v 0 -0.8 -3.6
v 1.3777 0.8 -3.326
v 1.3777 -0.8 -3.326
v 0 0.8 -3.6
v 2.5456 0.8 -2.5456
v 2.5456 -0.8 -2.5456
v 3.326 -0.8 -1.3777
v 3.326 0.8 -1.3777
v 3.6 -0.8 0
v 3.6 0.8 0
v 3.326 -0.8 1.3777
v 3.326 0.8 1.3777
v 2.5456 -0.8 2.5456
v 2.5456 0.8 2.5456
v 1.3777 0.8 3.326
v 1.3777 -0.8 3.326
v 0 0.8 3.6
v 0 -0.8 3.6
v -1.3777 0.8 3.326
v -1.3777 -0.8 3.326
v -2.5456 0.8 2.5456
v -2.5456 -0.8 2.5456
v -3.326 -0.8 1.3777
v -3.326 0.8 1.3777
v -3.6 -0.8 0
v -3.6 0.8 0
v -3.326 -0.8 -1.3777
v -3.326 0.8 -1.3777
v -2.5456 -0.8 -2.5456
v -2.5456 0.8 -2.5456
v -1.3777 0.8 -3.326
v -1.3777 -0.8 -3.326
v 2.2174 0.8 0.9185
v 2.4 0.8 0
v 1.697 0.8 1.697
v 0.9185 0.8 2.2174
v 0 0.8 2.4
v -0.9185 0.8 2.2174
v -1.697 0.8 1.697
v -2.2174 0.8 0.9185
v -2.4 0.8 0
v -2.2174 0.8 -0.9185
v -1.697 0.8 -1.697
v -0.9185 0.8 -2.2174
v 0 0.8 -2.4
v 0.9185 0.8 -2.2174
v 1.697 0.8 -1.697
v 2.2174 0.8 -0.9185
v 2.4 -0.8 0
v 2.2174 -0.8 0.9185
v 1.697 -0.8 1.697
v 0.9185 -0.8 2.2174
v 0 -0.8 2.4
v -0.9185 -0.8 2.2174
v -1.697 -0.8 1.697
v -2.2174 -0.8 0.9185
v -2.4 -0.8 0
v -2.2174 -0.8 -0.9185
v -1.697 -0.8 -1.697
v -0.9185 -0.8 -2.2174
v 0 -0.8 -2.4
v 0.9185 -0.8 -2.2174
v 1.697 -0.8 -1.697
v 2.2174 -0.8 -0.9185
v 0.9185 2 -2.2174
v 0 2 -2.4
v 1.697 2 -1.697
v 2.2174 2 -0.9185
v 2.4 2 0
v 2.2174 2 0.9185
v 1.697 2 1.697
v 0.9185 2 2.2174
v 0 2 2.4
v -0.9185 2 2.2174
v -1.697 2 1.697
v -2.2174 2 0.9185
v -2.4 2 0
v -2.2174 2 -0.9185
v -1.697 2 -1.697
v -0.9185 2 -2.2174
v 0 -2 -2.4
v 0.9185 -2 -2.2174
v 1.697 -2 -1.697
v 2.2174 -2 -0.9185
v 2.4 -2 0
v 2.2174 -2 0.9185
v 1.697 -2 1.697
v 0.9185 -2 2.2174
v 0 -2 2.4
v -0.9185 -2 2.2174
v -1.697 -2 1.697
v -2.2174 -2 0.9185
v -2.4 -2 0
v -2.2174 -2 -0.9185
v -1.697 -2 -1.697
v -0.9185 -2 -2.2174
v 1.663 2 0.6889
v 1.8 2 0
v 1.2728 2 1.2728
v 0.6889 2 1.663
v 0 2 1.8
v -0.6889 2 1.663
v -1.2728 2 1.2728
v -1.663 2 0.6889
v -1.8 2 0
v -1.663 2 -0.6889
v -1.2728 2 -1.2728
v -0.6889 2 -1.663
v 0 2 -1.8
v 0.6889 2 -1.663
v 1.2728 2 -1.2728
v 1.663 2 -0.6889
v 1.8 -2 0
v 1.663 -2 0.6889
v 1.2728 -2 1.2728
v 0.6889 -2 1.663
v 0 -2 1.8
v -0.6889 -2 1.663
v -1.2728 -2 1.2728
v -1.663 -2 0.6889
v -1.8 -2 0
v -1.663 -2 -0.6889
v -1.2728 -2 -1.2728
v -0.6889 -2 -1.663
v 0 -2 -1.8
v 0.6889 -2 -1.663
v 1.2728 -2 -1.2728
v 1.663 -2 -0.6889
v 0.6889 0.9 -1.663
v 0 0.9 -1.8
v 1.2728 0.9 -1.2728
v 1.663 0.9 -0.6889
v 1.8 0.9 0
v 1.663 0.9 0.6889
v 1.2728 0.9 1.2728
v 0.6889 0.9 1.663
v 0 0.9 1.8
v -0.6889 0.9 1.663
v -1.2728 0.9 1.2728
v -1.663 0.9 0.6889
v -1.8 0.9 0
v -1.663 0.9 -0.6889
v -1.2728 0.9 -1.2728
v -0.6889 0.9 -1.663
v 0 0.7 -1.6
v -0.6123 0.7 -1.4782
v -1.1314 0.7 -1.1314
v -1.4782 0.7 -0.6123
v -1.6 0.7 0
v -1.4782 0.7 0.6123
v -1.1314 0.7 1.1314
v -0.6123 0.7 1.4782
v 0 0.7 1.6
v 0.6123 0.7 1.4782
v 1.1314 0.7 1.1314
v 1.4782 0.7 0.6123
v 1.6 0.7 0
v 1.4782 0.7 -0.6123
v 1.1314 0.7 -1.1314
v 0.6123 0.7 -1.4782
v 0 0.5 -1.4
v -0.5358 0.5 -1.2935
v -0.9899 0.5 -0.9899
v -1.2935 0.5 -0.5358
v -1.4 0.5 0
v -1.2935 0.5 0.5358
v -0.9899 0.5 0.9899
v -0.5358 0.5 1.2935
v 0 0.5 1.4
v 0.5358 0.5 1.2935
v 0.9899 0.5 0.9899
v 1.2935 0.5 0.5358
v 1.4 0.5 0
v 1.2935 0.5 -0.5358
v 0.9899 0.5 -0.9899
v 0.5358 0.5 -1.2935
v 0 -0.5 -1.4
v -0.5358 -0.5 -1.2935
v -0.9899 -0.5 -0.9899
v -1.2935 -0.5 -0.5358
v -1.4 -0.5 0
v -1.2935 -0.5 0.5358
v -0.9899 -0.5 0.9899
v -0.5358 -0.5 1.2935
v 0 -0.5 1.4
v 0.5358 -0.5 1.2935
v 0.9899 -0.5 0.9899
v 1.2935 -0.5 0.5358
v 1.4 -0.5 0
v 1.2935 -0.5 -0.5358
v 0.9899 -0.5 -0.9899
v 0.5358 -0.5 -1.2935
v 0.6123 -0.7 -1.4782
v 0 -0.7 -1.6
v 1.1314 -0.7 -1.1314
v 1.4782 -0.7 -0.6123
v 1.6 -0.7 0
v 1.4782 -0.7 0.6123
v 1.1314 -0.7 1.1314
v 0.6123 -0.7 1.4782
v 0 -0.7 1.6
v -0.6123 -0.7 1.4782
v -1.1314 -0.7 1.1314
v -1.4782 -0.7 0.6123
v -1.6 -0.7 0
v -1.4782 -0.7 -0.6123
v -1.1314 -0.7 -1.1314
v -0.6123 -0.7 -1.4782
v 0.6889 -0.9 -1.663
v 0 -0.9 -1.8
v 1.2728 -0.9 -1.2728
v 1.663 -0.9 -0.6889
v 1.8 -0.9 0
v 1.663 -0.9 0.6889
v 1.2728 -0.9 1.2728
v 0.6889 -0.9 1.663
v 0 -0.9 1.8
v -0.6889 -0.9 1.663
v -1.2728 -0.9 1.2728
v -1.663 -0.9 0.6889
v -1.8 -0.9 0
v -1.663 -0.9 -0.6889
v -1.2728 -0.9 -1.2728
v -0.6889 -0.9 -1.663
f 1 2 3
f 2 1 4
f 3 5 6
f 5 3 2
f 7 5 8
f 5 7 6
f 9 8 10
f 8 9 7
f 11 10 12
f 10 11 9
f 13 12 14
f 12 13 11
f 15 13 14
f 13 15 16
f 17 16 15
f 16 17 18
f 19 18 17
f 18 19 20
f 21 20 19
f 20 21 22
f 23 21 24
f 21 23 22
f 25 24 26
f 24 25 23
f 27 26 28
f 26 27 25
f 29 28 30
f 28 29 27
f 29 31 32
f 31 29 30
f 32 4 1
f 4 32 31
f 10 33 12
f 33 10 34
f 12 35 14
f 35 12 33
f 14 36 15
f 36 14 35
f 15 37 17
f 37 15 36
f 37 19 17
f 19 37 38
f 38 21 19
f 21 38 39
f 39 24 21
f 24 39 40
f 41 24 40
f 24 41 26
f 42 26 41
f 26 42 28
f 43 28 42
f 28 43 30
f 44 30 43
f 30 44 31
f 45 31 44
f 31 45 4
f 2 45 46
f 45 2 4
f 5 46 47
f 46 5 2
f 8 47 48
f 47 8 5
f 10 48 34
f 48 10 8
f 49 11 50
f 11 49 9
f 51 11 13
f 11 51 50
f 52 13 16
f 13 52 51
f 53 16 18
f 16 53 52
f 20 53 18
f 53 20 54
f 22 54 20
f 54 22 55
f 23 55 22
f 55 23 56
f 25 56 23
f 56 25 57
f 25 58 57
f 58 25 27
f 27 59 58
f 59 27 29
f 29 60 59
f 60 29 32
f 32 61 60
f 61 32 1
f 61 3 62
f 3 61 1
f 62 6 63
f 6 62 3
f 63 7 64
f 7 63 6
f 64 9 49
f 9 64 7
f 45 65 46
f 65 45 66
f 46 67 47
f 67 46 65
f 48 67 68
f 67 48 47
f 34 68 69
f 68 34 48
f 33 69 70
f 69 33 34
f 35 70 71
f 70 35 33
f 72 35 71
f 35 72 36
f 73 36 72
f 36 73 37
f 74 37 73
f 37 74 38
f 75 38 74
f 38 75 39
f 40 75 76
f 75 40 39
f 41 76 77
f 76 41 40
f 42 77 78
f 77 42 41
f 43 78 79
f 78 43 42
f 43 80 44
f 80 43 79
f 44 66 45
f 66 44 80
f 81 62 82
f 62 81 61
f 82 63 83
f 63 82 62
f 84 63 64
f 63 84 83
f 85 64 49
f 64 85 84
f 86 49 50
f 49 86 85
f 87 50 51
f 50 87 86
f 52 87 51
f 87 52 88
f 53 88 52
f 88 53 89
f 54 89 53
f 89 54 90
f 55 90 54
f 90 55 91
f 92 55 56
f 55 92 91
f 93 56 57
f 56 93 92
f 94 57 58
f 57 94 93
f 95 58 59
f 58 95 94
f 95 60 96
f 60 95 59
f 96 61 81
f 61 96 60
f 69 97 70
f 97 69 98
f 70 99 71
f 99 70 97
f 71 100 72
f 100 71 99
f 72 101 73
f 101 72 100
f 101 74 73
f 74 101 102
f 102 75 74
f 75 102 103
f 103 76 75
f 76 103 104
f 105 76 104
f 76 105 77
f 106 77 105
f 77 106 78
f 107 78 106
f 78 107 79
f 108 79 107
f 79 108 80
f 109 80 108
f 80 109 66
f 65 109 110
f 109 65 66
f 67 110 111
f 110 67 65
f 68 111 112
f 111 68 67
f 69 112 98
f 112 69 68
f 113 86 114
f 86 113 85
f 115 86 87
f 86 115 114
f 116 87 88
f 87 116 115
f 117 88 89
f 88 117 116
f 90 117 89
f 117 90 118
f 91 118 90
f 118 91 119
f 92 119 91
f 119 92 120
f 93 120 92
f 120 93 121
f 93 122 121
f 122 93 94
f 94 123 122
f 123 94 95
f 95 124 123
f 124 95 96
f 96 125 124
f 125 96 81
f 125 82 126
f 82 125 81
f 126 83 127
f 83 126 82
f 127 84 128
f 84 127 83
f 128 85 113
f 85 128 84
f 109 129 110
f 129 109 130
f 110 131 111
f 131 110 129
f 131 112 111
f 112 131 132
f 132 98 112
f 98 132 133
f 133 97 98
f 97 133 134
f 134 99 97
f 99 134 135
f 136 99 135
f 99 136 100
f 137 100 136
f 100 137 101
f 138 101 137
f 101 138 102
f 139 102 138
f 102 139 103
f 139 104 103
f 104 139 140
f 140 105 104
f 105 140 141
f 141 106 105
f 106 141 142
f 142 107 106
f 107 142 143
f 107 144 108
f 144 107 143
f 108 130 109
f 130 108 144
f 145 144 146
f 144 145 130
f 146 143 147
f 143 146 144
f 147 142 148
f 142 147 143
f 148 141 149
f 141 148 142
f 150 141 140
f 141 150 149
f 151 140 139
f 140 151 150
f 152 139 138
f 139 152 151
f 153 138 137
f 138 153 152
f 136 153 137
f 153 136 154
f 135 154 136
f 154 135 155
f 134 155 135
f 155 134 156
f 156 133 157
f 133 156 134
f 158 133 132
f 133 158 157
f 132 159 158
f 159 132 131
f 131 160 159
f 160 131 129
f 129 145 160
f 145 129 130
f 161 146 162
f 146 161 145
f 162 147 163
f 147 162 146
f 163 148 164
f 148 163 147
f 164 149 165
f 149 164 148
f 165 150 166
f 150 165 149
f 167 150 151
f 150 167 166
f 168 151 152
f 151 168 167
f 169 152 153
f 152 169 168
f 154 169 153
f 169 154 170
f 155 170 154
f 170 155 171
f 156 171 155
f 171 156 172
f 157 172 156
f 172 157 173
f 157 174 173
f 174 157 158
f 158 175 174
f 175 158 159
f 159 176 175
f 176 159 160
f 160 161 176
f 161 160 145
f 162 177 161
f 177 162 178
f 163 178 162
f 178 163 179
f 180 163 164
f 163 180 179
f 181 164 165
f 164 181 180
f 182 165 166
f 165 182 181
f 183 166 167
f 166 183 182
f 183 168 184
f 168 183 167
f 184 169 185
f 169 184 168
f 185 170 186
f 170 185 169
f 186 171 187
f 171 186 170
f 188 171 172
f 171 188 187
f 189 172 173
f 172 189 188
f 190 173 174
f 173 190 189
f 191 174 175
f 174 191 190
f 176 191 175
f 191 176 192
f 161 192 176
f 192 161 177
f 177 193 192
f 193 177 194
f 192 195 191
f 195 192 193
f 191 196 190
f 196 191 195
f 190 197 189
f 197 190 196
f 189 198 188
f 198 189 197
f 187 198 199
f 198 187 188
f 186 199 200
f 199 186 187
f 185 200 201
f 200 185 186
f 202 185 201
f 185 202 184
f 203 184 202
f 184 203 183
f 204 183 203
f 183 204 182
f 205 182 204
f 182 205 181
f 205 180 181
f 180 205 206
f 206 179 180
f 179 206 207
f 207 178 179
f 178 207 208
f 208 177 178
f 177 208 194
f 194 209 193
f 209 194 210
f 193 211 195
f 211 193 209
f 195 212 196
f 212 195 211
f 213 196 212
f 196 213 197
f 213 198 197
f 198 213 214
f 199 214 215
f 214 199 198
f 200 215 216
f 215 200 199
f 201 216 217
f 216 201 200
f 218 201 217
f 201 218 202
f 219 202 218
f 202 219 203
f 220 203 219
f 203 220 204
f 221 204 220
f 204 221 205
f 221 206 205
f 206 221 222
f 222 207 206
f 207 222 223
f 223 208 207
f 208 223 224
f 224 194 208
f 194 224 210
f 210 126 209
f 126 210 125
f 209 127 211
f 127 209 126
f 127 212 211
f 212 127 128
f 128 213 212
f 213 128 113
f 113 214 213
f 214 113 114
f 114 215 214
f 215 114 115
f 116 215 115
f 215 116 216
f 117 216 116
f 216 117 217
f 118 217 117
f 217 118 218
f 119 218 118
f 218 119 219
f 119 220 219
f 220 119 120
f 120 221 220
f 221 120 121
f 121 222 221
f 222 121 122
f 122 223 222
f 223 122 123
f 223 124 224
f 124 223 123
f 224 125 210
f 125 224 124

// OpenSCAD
// file: ../../p/4-4edge.scad
use <../lib.scad>
function ldraw_lib__4_4edge() = [
// 0 Circle 1.0
// 0 Name: 4-4edge.dat
// 0 Author: James Jessiman
// 0 !LDRAW_ORG Primitive UPDATE 2017-01
// 0 !LICENSE Licensed under CC BY 2.0 and CC BY 4.0 : see CAreadme.txt
// 
// 0 BFC CERTIFY CCW
  [0,"BFC","CERTIFY"],
  [0,"BFC","CCW"],
// 
// 0 !HISTORY 1998-12-15 [PTadmin] Official Update 1998-10
// 0 !HISTORY 2005-12-28 [PTadmin] Official Update 2005-01
// 0 !HISTORY 2007-06-24 [PTadmin] Header formatted for Contributor Agreement
// 0 !HISTORY 2008-07-01 [PTadmin] Official Update 2008-01
// 0 !HISTORY 2017-01-15 [Steffen] BFCed
// 0 !HISTORY 2017-12-30 [PTadmin] Official Update 2017-01
// 
// 
// 2 24 1 0 0 0.9239 0 0.3827
  [2,24,1,0,0,0.9239,0,0.3827],
// 2 24 0.9239 0 0.3827 0.7071 0 0.7071
  [2,24,0.9239,0,0.3827,0.7071,0,0.7071],
// 2 24 0.7071 0 0.7071 0.3827 0 0.9239
  [2,24,0.7071,0,0.7071,0.3827,0,0.9239],
// 2 24 0.3827 0 0.9239 0 0 1
  [2,24,0.3827,0,0.9239,0,0,1],
// 2 24 0 0 1 -0.3827 0 0.9239
  [2,24,0,0,1,-0.3827,0,0.9239],
// 2 24 -0.3827 0 0.9239 -0.7071 0 0.7071
  [2,24,-0.3827,0,0.9239,-0.7071,0,0.7071],
// 2 24 -0.7071 0 0.7071 -0.9239 0 0.3827
  [2,24,-0.7071,0,0.7071,-0.9239,0,0.3827],
// 2 24 -0.9239 0 0.3827 -1 0 -0
  [2,24,-0.9239,0,0.3827,-1,0,-0],
// 2 24 -1 0 -0 -0.9239 0 -0.3827
  [2,24,-1,0,-0,-0.9239,0,-0.3827],
// 2 24 -0.9239 0 -0.3827 -0.7071 0 -0.7071
  [2,24,-0.9239,0,-0.3827,-0.7071,0,-0.7071],
// 2 24 -0.7071 0 -0.7071 -0.3827 0 -0.9239
  [2,24,-0.7071,0,-0.7071,-0.3827,0,-0.9239],
// 2 24 -0.3827 0 -0.9239 0 0 -1
  [2,24,-0.3827,0,-0.9239,0,0,-1],
// 2 24 0 0 -1 0.3827 0 -0.9239
  [2,24,0,0,-1,0.3827,0,-0.9239],
// 2 24 0.3827 0 -0.9239 0.7071 0 -0.7071
  [2,24,0.3827,0,-0.9239,0.7071,0,-0.7071],
// 2 24 0.7071 0 -0.7071 0.9239 0 -0.3827
  [2,24,0.7071,0,-0.7071,0.9239,0,-0.3827],
// 2 24 0.9239 0 -0.3827 1 0 0
  [2,24,0.9239,0,-0.3827,1,0,0],
];
module ldraw_lib__4_4edge(step=0, col=false, unit=2/5, alt=false, line=0.2, solid=!$preview)
    makepoly(ldraw_lib__4_4edge(), step=step, col=col, unit=unit, alt=alt, line=line, solid=solid);
ldraw_lib__4_4edge(line=0.2);
// file: ../../p/4-4cyli.scad
use <../lib.scad>
function ldraw_lib__4_4cyli() = [
// 0 Cylinder 1.0
// 0 Name: 4-4cyli.dat
// 0 Author: James Jessiman
// 0 !LDRAW_ORG Primitive UPDATE 2005-01
// 0 !LICENSE Licensed under CC BY 2.0 and CC BY 4.0 : see CAreadme.txt
// 
// 0 BFC CERTIFY CCW
  [0,"BFC","CERTIFY"],
  [0,"BFC","CCW"],
// 
// 0 !HISTORY 1998-12-15 [PTadmin] Official Update 1998-10
// 0 !HISTORY 2002-03-23 [sbliss] Added BFC statement; merged headers from files in distributions LDraw 0.27 and Complete.
// 0 !HISTORY 2002-04-25 [PTadmin] Official Update 2002-02
// 0 !HISTORY 2004-12-14 [guyvivan] BFC CCW
// 0 !HISTORY 2005-12-28 [PTadmin] Official Update 2005-01
// 0 !HISTORY 2007-06-24 [PTadmin] Header formatted for Contributor Agreement
// 0 !HISTORY 2008-07-01 [PTadmin] Official Update 2008-01
// 
// 
// 4 16 1 1 0 0.9239 1 0.3827 0.9239 0 0.3827 1 0 0
  [4,16,1,1,0,0.9239,1,0.3827,0.9239,0,0.3827,1,0,0],
// 5 24 1 0 0 1 1 0 0.9239 0 0.3827 0.9239 0 -0.3827
  [5,24,1,0,0,1,1,0,0.9239,0,0.3827,0.9239,0,-0.3827],
// 4 16 0.9239 1 0.3827 0.7071 1 0.7071 0.7071 0 0.7071 0.9239 0 0.3827
  [4,16,0.9239,1,0.3827,0.7071,1,0.7071,0.7071,0,0.7071,0.9239,0,0.3827],
// 5 24 0.9239 0 0.3827 0.9239 1 0.3827 0.7071 0 0.7071 1 0 0
  [5,24,0.9239,0,0.3827,0.9239,1,0.3827,0.7071,0,0.7071,1,0,0],
// 4 16 0.7071 1 0.7071 0.3827 1 0.9239 0.3827 0 0.9239 0.7071 0 0.7071
  [4,16,0.7071,1,0.7071,0.3827,1,0.9239,0.3827,0,0.9239,0.7071,0,0.7071],
// 5 24 0.7071 0 0.7071 0.7071 1 0.7071 0.3827 0 0.9239 0.9239 0 0.3827
  [5,24,0.7071,0,0.7071,0.7071,1,0.7071,0.3827,0,0.9239,0.9239,0,0.3827],
// 4 16 0.3827 1 0.9239 0 1 1 0 0 1 0.3827 0 0.9239
  [4,16,0.3827,1,0.9239,0,1,1,0,0,1,0.3827,0,0.9239],
// 5 24 0.3827 0 0.9239 0.3827 1 0.9239 0 0 1 0.7071 0 0.7071
  [5,24,0.3827,0,0.9239,0.3827,1,0.9239,0,0,1,0.7071,0,0.7071],
// 4 16 0 1 1 -0.3827 1 0.9239 -0.3827 0 0.9239 0 0 1
  [4,16,0,1,1,-0.3827,1,0.9239,-0.3827,0,0.9239,0,0,1],
// 5 24 0 0 1 0 1 1 -0.3827 0 0.9239 0.3827 0 0.9239
  [5,24,0,0,1,0,1,1,-0.3827,0,0.9239,0.3827,0,0.9239],
// 4 16 -0.3827 1 0.9239 -0.7071 1 0.7071 -0.7071 0 0.7071 -0.3827 0 0.9239
  [4,16,-0.3827,1,0.9239,-0.7071,1,0.7071,-0.7071,0,0.7071,-0.3827,0,0.9239],
// 5 24 -0.3827 0 0.9239 -0.3827 1 0.9239 -0.7071 0 0.7071 0 0 1
  [5,24,-0.3827,0,0.9239,-0.3827,1,0.9239,-0.7071,0,0.7071,0,0,1],
// 4 16 -0.7071 1 0.7071 -0.9239 1 0.3827 -0.9239 0 0.3827 -0.7071 0 0.7071
  [4,16,-0.7071,1,0.7071,-0.9239,1,0.3827,-0.9239,0,0.3827,-0.7071,0,0.7071],
// 5 24 -0.7071 0 0.7071 -0.7071 1 0.7071 -0.9239 0 0.3827 -0.3827 0 0.9239
  [5,24,-0.7071,0,0.7071,-0.7071,1,0.7071,-0.9239,0,0.3827,-0.3827,0,0.9239],
// 4 16 -0.9239 1 0.3827 -1 1 0 -1 0 0 -0.9239 0 0.3827
  [4,16,-0.9239,1,0.3827,-1,1,0,-1,0,0,-0.9239,0,0.3827],
// 5 24 -0.9239 0 0.3827 -0.9239 1 0.3827 -1 0 0 -0.7071 0 0.7071
  [5,24,-0.9239,0,0.3827,-0.9239,1,0.3827,-1,0,0,-0.7071,0,0.7071],
// 4 16 -1 1 0 -0.9239 1 -0.3827 -0.9239 0 -0.3827 -1 0 0
  [4,16,-1,1,0,-0.9239,1,-0.3827,-0.9239,0,-0.3827,-1,0,0],
// 5 24 -1 0 0 -1 1 0 -0.9239 0 -0.3827 -0.9239 0 0.3827
  [5,24,-1,0,0,-1,1,0,-0.9239,0,-0.3827,-0.9239,0,0.3827],
// 4 16 -0.9239 1 -0.3827 -0.7071 1 -0.7071 -0.7071 0 -0.7071 -0.9239 0 -0.3827
  [4,16,-0.9239,1,-0.3827,-0.7071,1,-0.7071,-0.7071,0,-0.7071,-0.9239,0,-0.3827],
// 5 24 -0.9239 0 -0.3827 -0.9239 1 -0.3827 -0.7071 0 -0.7071 -1 0 0
  [5,24,-0.9239,0,-0.3827,-0.9239,1,-0.3827,-0.7071,0,-0.7071,-1,0,0],
// 4 16 -0.7071 1 -0.7071 -0.3827 1 -0.9239 -0.3827 0 -0.9239 -0.7071 0 -0.7071
  [4,16,-0.7071,1,-0.7071,-0.3827,1,-0.9239,-0.3827,0,-0.9239,-0.7071,0,-0.7071],
// 5 24 -0.7071 0 -0.7071 -0.7071 1 -0.7071 -0.3827 0 -0.9239 -0.9239 0 -0.3827
  [5,24,-0.7071,0,-0.7071,-0.7071,1,-0.7071,-0.3827,0,-0.9239,-0.9239,0,-0.3827],
// 4 16 -0.3827 1 -0.9239 0 1 -1 0 0 -1 -0.3827 0 -0.9239
  [4,16,-0.3827,1,-0.9239,0,1,-1,0,0,-1,-0.3827,0,-0.9239],
// 5 24 -0.3827 0 -0.9239 -0.3827 1 -0.9239 0 0 -1 -0.7071 0 -0.7071
  [5,24,-0.3827,0,-0.9239,-0.3827,1,-0.9239,0,0,-1,-0.7071,0,-0.7071],
// 4 16 0 1 -1 0.3827 1 -0.9239 0.3827 0 -0.9239 0 0 -1
  [4,16,0,1,-1,0.3827,1,-0.9239,0.3827,0,-0.9239,0,0,-1],
// 5 24 0 0 -1 0 1 -1 0.3827 0 -0.9239 -0.3827 0 -0.9239
  [5,24,0,0,-1,0,1,-1,0.3827,0,-0.9239,-0.3827,0,-0.9239],
// 4 16 0.3827 1 -0.9239 0.7071 1 -0.7071 0.7071 0 -0.7071 0.3827 0 -0.9239
  [4,16,0.3827,1,-0.9239,0.7071,1,-0.7071,0.7071,0,-0.7071,0.3827,0,-0.9239],
// 5 24 0.3827 0 -0.9239 0.3827 1 -0.9239 0.7071 0 -0.7071 0 0 -1
  [5,24,0.3827,0,-0.9239,0.3827,1,-0.9239,0.7071,0,-0.7071,0,0,-1],
// 4 16 0.7071 1 -0.7071 0.9239 1 -0.3827 0.9239 0 -0.3827 0.7071 0 -0.7071
  [4,16,0.7071,1,-0.7071,0.9239,1,-0.3827,0.9239,0,-0.3827,0.7071,0,-0.7071],
// 5 24 0.7071 0 -0.7071 0.7071 1 -0.7071 0.9239 0 -0.3827 0.3827 0 -0.9239
  [5,24,0.7071,0,-0.7071,0.7071,1,-0.7071,0.9239,0,-0.3827,0.3827,0,-0.9239],
// 4 16 0.9239 1 -0.3827 1 1 0 1 0 0 0.9239 0 -0.3827
  [4,16,0.9239,1,-0.3827,1,1,0,1,0,0,0.9239,0,-0.3827],
// 5 24 0.9239 0 -0.3827 0.9239 1 -0.3827 1 0 0 0.7071 0 -0.7071
  [5,24,0.9239,0,-0.3827,0.9239,1,-0.3827,1,0,0,0.7071,0,-0.7071],
// 0
];
module ldraw_lib__4_4cyli(step=0, col=false, unit=2/5, alt=false, line=0.2, solid=!$preview)
    makepoly(ldraw_lib__4_4cyli(), step=step, col=col, unit=unit, alt=alt, line=line, solid=solid);
ldraw_lib__4_4cyli(line=0.2);
// file: ../../p/4-4ring3.scad
use <../lib.scad>
function ldraw_lib__4_4ring3() = [
// 0 Ring  3 x 1.0
// 0 Name: 4-4ring3.dat
// 0 Author: James Jessiman
// 0 !LDRAW_ORG Primitive UPDATE 2009-01
// 0 !LICENSE Licensed under CC BY 2.0 and CC BY 4.0 : see CAreadme.txt
// 
// 0 BFC CERTIFY CCW
  [0,"BFC","CERTIFY"],
  [0,"BFC","CCW"],
// 
// 0 !HISTORY 1998-12-15 [PTadmin] Official Update 1998-10
// 0 !HISTORY 2002-04-05 [hafhead] Added BFC statement
// 0 !HISTORY 2002-04-25 [PTadmin] Official Update 2002-02
// 0 !HISTORY 2007-06-24 [PTadmin] Header formatted for Contributor Agreement
// 0 !HISTORY 2008-07-01 [PTadmin] Official Update 2008-01
// 0 !HISTORY 2008-08-26 [cwdee] Switch polygon winding and rename
// 0 !HISTORY 2009-05-02 [PTadmin] Official Update 2009-01
// 
// 
// 4 16 -1.5308 0 3.6956 -1.1481 0 2.7717 0 0 3 0 0 4
  [4,16,-1.5308,0,3.6956,-1.1481,0,2.7717,0,0,3,0,0,4],
// 4 16 -2.8284 0 2.8284 -2.1213 0 2.1213 -1.1481 0 2.7717 -1.5308 0 3.6956
  [4,16,-2.8284,0,2.8284,-2.1213,0,2.1213,-1.1481,0,2.7717,-1.5308,0,3.6956],
// 4 16 -3.6956 0 1.5308 -2.7717 0 1.1481 -2.1213 0 2.1213 -2.8284 0 2.8284
  [4,16,-3.6956,0,1.5308,-2.7717,0,1.1481,-2.1213,0,2.1213,-2.8284,0,2.8284],
// 4 16 -4 0 0 -3 0 0 -2.7717 0 1.1481 -3.6956 0 1.5308
  [4,16,-4,0,0,-3,0,0,-2.7717,0,1.1481,-3.6956,0,1.5308],
// 4 16 -3.6956 0 -1.5308 -2.7717 0 -1.1481 -3 0 0 -4 0 0
  [4,16,-3.6956,0,-1.5308,-2.7717,0,-1.1481,-3,0,0,-4,0,0],
// 4 16 -2.8284 0 -2.8284 -2.1213 0 -2.1213 -2.7717 0 -1.1481 -3.6956 0 -1.5308
  [4,16,-2.8284,0,-2.8284,-2.1213,0,-2.1213,-2.7717,0,-1.1481,-3.6956,0,-1.5308],
// 4 16 -1.5308 0 -3.6956 -1.1481 0 -2.7717 -2.1213 0 -2.1213 -2.8284 0 -2.8284
  [4,16,-1.5308,0,-3.6956,-1.1481,0,-2.7717,-2.1213,0,-2.1213,-2.8284,0,-2.8284],
// 4 16 0 0 -4 0 0 -3 -1.1481 0 -2.7717 -1.5308 0 -3.6956
  [4,16,0,0,-4,0,0,-3,-1.1481,0,-2.7717,-1.5308,0,-3.6956],
// 4 16 1.5308 0 -3.6956 1.1481 0 -2.7717 0 0 -3 0 0 -4
  [4,16,1.5308,0,-3.6956,1.1481,0,-2.7717,0,0,-3,0,0,-4],
// 4 16 2.8284 0 -2.8284 2.1213 0 -2.1213 1.1481 0 -2.7717 1.5308 0 -3.6956
  [4,16,2.8284,0,-2.8284,2.1213,0,-2.1213,1.1481,0,-2.7717,1.5308,0,-3.6956],
// 4 16 3.6956 0 -1.5308 2.7717 0 -1.1481 2.1213 0 -2.1213 2.8284 0 -2.8284
  [4,16,3.6956,0,-1.5308,2.7717,0,-1.1481,2.1213,0,-2.1213,2.8284,0,-2.8284],
// 4 16 4 0 0 3 0 0 2.7717 0 -1.1481 3.6956 0 -1.5308
  [4,16,4,0,0,3,0,0,2.7717,0,-1.1481,3.6956,0,-1.5308],
// 4 16 3.6956 0 1.5308 2.7717 0 1.1481 3 0 0 4 0 0
  [4,16,3.6956,0,1.5308,2.7717,0,1.1481,3,0,0,4,0,0],
// 4 16 2.8284 0 2.8284 2.1213 0 2.1213 2.7717 0 1.1481 3.6956 0 1.5308
  [4,16,2.8284,0,2.8284,2.1213,0,2.1213,2.7717,0,1.1481,3.6956,0,1.5308],
// 4 16 1.5308 0 3.6956 1.1481 0 2.7717 2.1213 0 2.1213 2.8284 0 2.8284
  [4,16,1.5308,0,3.6956,1.1481,0,2.7717,2.1213,0,2.1213,2.8284,0,2.8284],
// 4 16 0 0 4 0 0 3 1.1481 0 2.7717 1.5308 0 3.6956
  [4,16,0,0,4,0,0,3,1.1481,0,2.7717,1.5308,0,3.6956],
// 0
];
module ldraw_lib__4_4ring3(step=0, col=false, unit=2/5, alt=false, line=0.2, solid=!$preview)
    makepoly(ldraw_lib__4_4ring3(), step=step, col=col, unit=unit, alt=alt, line=line, solid=solid);
ldraw_lib__4_4ring3(line=0.2);
// file: ../../p/4-4ring2.scad
use <../lib.scad>
function ldraw_lib__4_4ring2() = [
// 0 Ring  2 x 1.0
// 0 Name: 4-4ring2.dat
// 0 Author: James Jessiman
// 0 !LDRAW_ORG Primitive UPDATE 2009-01
// 0 !LICENSE Licensed under CC BY 2.0 and CC BY 4.0 : see CAreadme.txt
// 
// 0 BFC CERTIFY CCW
  [0,"BFC","CERTIFY"],
  [0,"BFC","CCW"],
// 
// 0 !HISTORY 1998-12-15 [PTadmin] Official Update 1998-10
// 0 !HISTORY 2002-04-05 [hafhead] Added BFC statement
// 0 !HISTORY 2002-04-25 [PTadmin] Official Update 2002-02
// 0 !HISTORY 2007-06-24 [PTadmin] Header formatted for Contributor Agreement
// 0 !HISTORY 2008-07-01 [PTadmin] Official Update 2008-01
// 0 !HISTORY 2008-08-26 [cwdee] Switch polygon winding and rename
// 0 !HISTORY 2009-05-02 [PTadmin] Official Update 2009-01
// 
// 
// 4 16 -1.1481 0 2.7717 -0.7654 0 1.8478 0 0 2 0 0 3
  [4,16,-1.1481,0,2.7717,-0.7654,0,1.8478,0,0,2,0,0,3],
// 4 16 -2.1213 0 2.1213 -1.4142 0 1.4142 -0.7654 0 1.8478 -1.1481 0 2.7717
  [4,16,-2.1213,0,2.1213,-1.4142,0,1.4142,-0.7654,0,1.8478,-1.1481,0,2.7717],
// 4 16 -2.7717 0 1.1481 -1.8478 0 0.7654 -1.4142 0 1.4142 -2.1213 0 2.1213
  [4,16,-2.7717,0,1.1481,-1.8478,0,0.7654,-1.4142,0,1.4142,-2.1213,0,2.1213],
// 4 16 -3 0 0 -2 0 0 -1.8478 0 0.7654 -2.7717 0 1.1481
  [4,16,-3,0,0,-2,0,0,-1.8478,0,0.7654,-2.7717,0,1.1481],
// 4 16 -2.7717 0 -1.1481 -1.8478 0 -0.7654 -2 0 0 -3 0 0
  [4,16,-2.7717,0,-1.1481,-1.8478,0,-0.7654,-2,0,0,-3,0,0],
// 4 16 -2.1213 0 -2.1213 -1.4142 0 -1.4142 -1.8478 0 -0.7654 -2.7717 0 -1.1481
  [4,16,-2.1213,0,-2.1213,-1.4142,0,-1.4142,-1.8478,0,-0.7654,-2.7717,0,-1.1481],
// 4 16 -1.1481 0 -2.7717 -0.7654 0 -1.8478 -1.4142 0 -1.4142 -2.1213 0 -2.1213
  [4,16,-1.1481,0,-2.7717,-0.7654,0,-1.8478,-1.4142,0,-1.4142,-2.1213,0,-2.1213],
// 4 16 0 0 -3 0 0 -2 -0.7654 0 -1.8478 -1.1481 0 -2.7717
  [4,16,0,0,-3,0,0,-2,-0.7654,0,-1.8478,-1.1481,0,-2.7717],
// 4 16 1.1481 0 -2.7717 0.7654 0 -1.8478 0 0 -2 0 0 -3
  [4,16,1.1481,0,-2.7717,0.7654,0,-1.8478,0,0,-2,0,0,-3],
// 4 16 2.1213 0 -2.1213 1.4142 0 -1.4142 0.7654 0 -1.8478 1.1481 0 -2.7717
  [4,16,2.1213,0,-2.1213,1.4142,0,-1.4142,0.7654,0,-1.8478,1.1481,0,-2.7717],
// 4 16 2.7717 0 -1.1481 1.8478 0 -0.7654 1.4142 0 -1.4142 2.1213 0 -2.1213
  [4,16,2.7717,0,-1.1481,1.8478,0,-0.7654,1.4142,0,-1.4142,2.1213,0,-2.1213],
// 4 16 3 0 0 2 0 0 1.8478 0 -0.7654 2.7717 0 -1.1481
  [4,16,3,0,0,2,0,0,1.8478,0,-0.7654,2.7717,0,-1.1481],
// 4 16 2.7717 0 1.1481 1.8478 0 0.7654 2 0 0 3 0 0
  [4,16,2.7717,0,1.1481,1.8478,0,0.7654,2,0,0,3,0,0],
// 4 16 2.1213 0 2.1213 1.4142 0 1.4142 1.8478 0 0.7654 2.7717 0 1.1481
  [4,16,2.1213,0,2.1213,1.4142,0,1.4142,1.8478,0,0.7654,2.7717,0,1.1481],
// 4 16 1.1481 0 2.7717 0.7654 0 1.8478 1.4142 0 1.4142 2.1213 0 2.1213
  [4,16,1.1481,0,2.7717,0.7654,0,1.8478,1.4142,0,1.4142,2.1213,0,2.1213],
// 4 16 0 0 3 0 0 2 0.7654 0 1.8478 1.1481 0 2.7717
  [4,16,0,0,3,0,0,2,0.7654,0,1.8478,1.1481,0,2.7717],
// 0
];
module ldraw_lib__4_4ring2(step=0, col=false, unit=2/5, alt=false, line=0.2, solid=!$preview)
    makepoly(ldraw_lib__4_4ring2(), step=step, col=col, unit=unit, alt=alt, line=line, solid=solid);
ldraw_lib__4_4ring2(line=0.2);
// file: ../../p/4-4cylo.scad
use <../lib.scad>
use <4-4cyli.scad>
use <4-4edge.scad>
function ldraw_lib__4_4cylo() = [
// 0 Cylinder Open 1.0
// 0 Name: 4-4cylo.dat
// 0 Author: Mark Kennedy [mkennedy]
// 0 !LDRAW_ORG Primitive UPDATE 2010-01
// 0 !LICENSE Licensed under CC BY 2.0 and CC BY 4.0 : see CAreadme.txt
// 
// 0 BFC CERTIFY CCW
  [0,"BFC","CERTIFY"],
  [0,"BFC","CCW"],
// 
// 0 !HISTORY 2010-04-05 [PTadmin] Official Update 2010-01
// 
// 
// 1 16 0 0 0 1 0 0 0 1 0 0 0 1 4-4edge.dat
  [1,16,0,0,0,1,0,0,0,1,0,0,0,1, ldraw_lib__4_4edge()],
// 1 16 0 1 0 1 0 0 0 1 0 0 0 1 4-4edge.dat
  [1,16,0,1,0,1,0,0,0,1,0,0,0,1, ldraw_lib__4_4edge()],
// 1 16 0 0 0 1 0 0 0 1 0 0 0 1 4-4cyli.dat
  [1,16,0,0,0,1,0,0,0,1,0,0,0,1, ldraw_lib__4_4cyli()],
// 0
];
module ldraw_lib__4_4cylo(step=0, col=false, unit=2/5, alt=false, line=0.2, solid=!$preview)
    makepoly(ldraw_lib__4_4cylo(), step=step, col=col, unit=unit, alt=alt, line=line, solid=solid);
ldraw_lib__4_4cylo(line=0.2);
// file: ../../p/4-4con8.scad
use <../lib.scad>
function ldraw_lib__4_4con8() = [
// 0 Cone  8 x 1.0
// 0 Name: 4-4con8.dat
// 0 Author: Steve Bliss [sbliss]
// 0 !LDRAW_ORG Primitive UPDATE 2012-01
// 0 !LICENSE Licensed under CC BY 2.0 and CC BY 4.0 : see CAreadme.txt
// 
// 0 BFC CERTIFY CCW
  [0,"BFC","CERTIFY"],
  [0,"BFC","CCW"],
// 
// 0 !HISTORY 2000-09-30 [PTadmin] Official Update 2000-02
// 0 !HISTORY 2002-12-11 [cwdee] Standardised title
// 0 !HISTORY 2003-03-12 [PTadmin] Official Update 2003-01
// 0 !HISTORY 2007-06-24 [PTadmin] Header formatted for Contributor Agreement
// 0 !HISTORY 2008-07-01 [PTadmin] Official Update 2008-01
// 0 !HISTORY 2012-02-16 [Philo] Changed to CCW
// 0 !HISTORY 2012-03-30 [PTadmin] Official Update 2012-01
// 
// 
// 5 24 8 1 0 9 0 0 7.3912 1 -3.0616 7.3912 1 3.0616
  [5,24,8,1,0,9,0,0,7.3912,1,-3.0616,7.3912,1,3.0616],
// 5 24 7.3912 1 3.0616 8.3151 0 3.4443 8 1 0 5.6568 1 5.6568
  [5,24,7.3912,1,3.0616,8.3151,0,3.4443,8,1,0,5.6568,1,5.6568],
// 5 24 5.6568 1 5.6568 6.3639 0 6.3639 7.3912 1 3.0616 3.0616 1 7.3912
  [5,24,5.6568,1,5.6568,6.3639,0,6.3639,7.3912,1,3.0616,3.0616,1,7.3912],
// 5 24 3.0616 1 7.3912 3.4443 0 8.3151 5.6568 1 5.6568 0 1 8
  [5,24,3.0616,1,7.3912,3.4443,0,8.3151,5.6568,1,5.6568,0,1,8],
// 5 24 0 1 8 0 0 9 3.0616 1 7.3912 -3.0616 1 7.3912
  [5,24,0,1,8,0,0,9,3.0616,1,7.3912,-3.0616,1,7.3912],
// 5 24 -3.0616 1 7.3912 -3.4443 0 8.3151 0 1 8 -5.6568 1 5.6568
  [5,24,-3.0616,1,7.3912,-3.4443,0,8.3151,0,1,8,-5.6568,1,5.6568],
// 5 24 -5.6568 1 5.6568 -6.3639 0 6.3639 -3.0616 1 7.3912 -7.3912 1 3.0616
  [5,24,-5.6568,1,5.6568,-6.3639,0,6.3639,-3.0616,1,7.3912,-7.3912,1,3.0616],
// 5 24 -7.3912 1 3.0616 -8.3151 0 3.4443 -5.6568 1 5.6568 -8 1 0
  [5,24,-7.3912,1,3.0616,-8.3151,0,3.4443,-5.6568,1,5.6568,-8,1,0],
// 5 24 -8 1 0 -9 0 0 -7.3912 1 3.0616 -7.3912 1 -3.0616
  [5,24,-8,1,0,-9,0,0,-7.3912,1,3.0616,-7.3912,1,-3.0616],
// 5 24 -7.3912 1 -3.0616 -8.3151 0 -3.4443 -8 1 0 -5.6568 1 -5.6568
  [5,24,-7.3912,1,-3.0616,-8.3151,0,-3.4443,-8,1,0,-5.6568,1,-5.6568],
// 5 24 -5.6568 1 -5.6568 -6.3639 0 -6.3639 -7.3912 1 -3.0616 -3.0616 1 -7.3912
  [5,24,-5.6568,1,-5.6568,-6.3639,0,-6.3639,-7.3912,1,-3.0616,-3.0616,1,-7.3912],
// 5 24 -3.0616 1 -7.3912 -3.4443 0 -8.3151 -5.6568 1 -5.6568 0 1 -8
  [5,24,-3.0616,1,-7.3912,-3.4443,0,-8.3151,-5.6568,1,-5.6568,0,1,-8],
// 5 24 0 1 -8 0 0 -9 -3.0616 1 -7.3912 3.0616 1 -7.3912
  [5,24,0,1,-8,0,0,-9,-3.0616,1,-7.3912,3.0616,1,-7.3912],
// 5 24 3.0616 1 -7.3912 3.4443 0 -8.3151 0 1 -8 5.6568 1 -5.6568
  [5,24,3.0616,1,-7.3912,3.4443,0,-8.3151,0,1,-8,5.6568,1,-5.6568],
// 5 24 5.6568 1 -5.6568 6.3639 0 -6.3639 3.0616 1 -7.3912 7.3912 1 -3.0616
  [5,24,5.6568,1,-5.6568,6.3639,0,-6.3639,3.0616,1,-7.3912,7.3912,1,-3.0616],
// 5 24 7.3912 1 -3.0616 8.3151 0 -3.4443 5.6568 1 -5.6568 8 1 0
  [5,24,7.3912,1,-3.0616,8.3151,0,-3.4443,5.6568,1,-5.6568,8,1,0],
// 
// 4 16 7.3912 1 3.0616 8.3151 0 3.4443 9 0 0 8 1 0
  [4,16,7.3912,1,3.0616,8.3151,0,3.4443,9,0,0,8,1,0],
// 4 16 5.6568 1 5.6568 6.3639 0 6.3639 8.3151 0 3.4443 7.3912 1 3.0616
  [4,16,5.6568,1,5.6568,6.3639,0,6.3639,8.3151,0,3.4443,7.3912,1,3.0616],
// 4 16 3.0616 1 7.3912 3.4443 0 8.3151 6.3639 0 6.3639 5.6568 1 5.6568
  [4,16,3.0616,1,7.3912,3.4443,0,8.3151,6.3639,0,6.3639,5.6568,1,5.6568],
// 4 16 0 1 8 0 0 9 3.4443 0 8.3151 3.0616 1 7.3912
  [4,16,0,1,8,0,0,9,3.4443,0,8.3151,3.0616,1,7.3912],
// 4 16 -3.0616 1 7.3912 -3.4443 0 8.3151 0 0 9 0 1 8
  [4,16,-3.0616,1,7.3912,-3.4443,0,8.3151,0,0,9,0,1,8],
// 4 16 -5.6568 1 5.6568 -6.3639 0 6.3639 -3.4443 0 8.3151 -3.0616 1 7.3912
  [4,16,-5.6568,1,5.6568,-6.3639,0,6.3639,-3.4443,0,8.3151,-3.0616,1,7.3912],
// 4 16 -7.3912 1 3.0616 -8.3151 0 3.4443 -6.3639 0 6.3639 -5.6568 1 5.6568
  [4,16,-7.3912,1,3.0616,-8.3151,0,3.4443,-6.3639,0,6.3639,-5.6568,1,5.6568],
// 4 16 -8 1 0 -9 0 0 -8.3151 0 3.4443 -7.3912 1 3.0616
  [4,16,-8,1,0,-9,0,0,-8.3151,0,3.4443,-7.3912,1,3.0616],
// 4 16 -7.3912 1 -3.0616 -8.3151 0 -3.4443 -9 0 0 -8 1 0
  [4,16,-7.3912,1,-3.0616,-8.3151,0,-3.4443,-9,0,0,-8,1,0],
// 4 16 -5.6568 1 -5.6568 -6.3639 0 -6.3639 -8.3151 0 -3.4443 -7.3912 1 -3.0616
  [4,16,-5.6568,1,-5.6568,-6.3639,0,-6.3639,-8.3151,0,-3.4443,-7.3912,1,-3.0616],
// 4 16 -3.0616 1 -7.3912 -3.4443 0 -8.3151 -6.3639 0 -6.3639 -5.6568 1 -5.6568
  [4,16,-3.0616,1,-7.3912,-3.4443,0,-8.3151,-6.3639,0,-6.3639,-5.6568,1,-5.6568],
// 4 16 0 1 -8 0 0 -9 -3.4443 0 -8.3151 -3.0616 1 -7.3912
  [4,16,0,1,-8,0,0,-9,-3.4443,0,-8.3151,-3.0616,1,-7.3912],
// 4 16 3.0616 1 -7.3912 3.4443 0 -8.3151 0 0 -9 0 1 -8
  [4,16,3.0616,1,-7.3912,3.4443,0,-8.3151,0,0,-9,0,1,-8],
// 4 16 5.6568 1 -5.6568 6.3639 0 -6.3639 3.4443 0 -8.3151 3.0616 1 -7.3912
  [4,16,5.6568,1,-5.6568,6.3639,0,-6.3639,3.4443,0,-8.3151,3.0616,1,-7.3912],
// 4 16 7.3912 1 -3.0616 8.3151 0 -3.4443 6.3639 0 -6.3639 5.6568 1 -5.6568
  [4,16,7.3912,1,-3.0616,8.3151,0,-3.4443,6.3639,0,-6.3639,5.6568,1,-5.6568],
// 4 16 8 1 0 9 0 0 8.3151 0 -3.4443 7.3912 1 -3.0616
  [4,16,8,1,0,9,0,0,8.3151,0,-3.4443,7.3912,1,-3.0616],
];
module ldraw_lib__4_4con8(step=0, col=false, unit=2/5, alt=false, line=0.2, solid=!$preview)
    makepoly(ldraw_lib__4_4con8(), step=step, col=col, unit=unit, alt=alt, line=line, solid=solid);
ldraw_lib__4_4con8(line=0.2);
// file: ../../p/4-4con7.scad
use <../lib.scad>
function ldraw_lib__4_4con7() = [
// 0 Cone  7 x 1.0
// 0 Name: 4-4con7.dat
// 0 Author: Niels Karsdorp [nielsk]
// 0 !LDRAW_ORG Primitive UPDATE 2004-04
// 0 !LICENSE Licensed under CC BY 2.0 and CC BY 4.0 : see CAreadme.txt
// 
// 0 BFC CERTIFY CCW
  [0,"BFC","CERTIFY"],
  [0,"BFC","CCW"],
// 
// 0 !HISTORY 2004-11-06 [PTadmin] Official Update 2004-04
// 0 !HISTORY 2007-06-24 [PTadmin] Header formatted for Contributor Agreement
// 0 !HISTORY 2008-07-01 [PTadmin] Official Update 2008-01
// 
// 
// 5 24 7 1 0 8 0 0 6.4673 1 2.6789 6.4673 1 -2.6789
  [5,24,7,1,0,8,0,0,6.4673,1,2.6789,6.4673,1,-2.6789],
// 5 24 6.4673 1 2.6789 7.3912 0 3.0616 4.9497 1 4.9497 7 1 0
  [5,24,6.4673,1,2.6789,7.3912,0,3.0616,4.9497,1,4.9497,7,1,0],
// 5 24 4.9497 1 4.9497 5.6568 0 5.6568 2.6789 1 6.4673 6.4673 1 2.6789
  [5,24,4.9497,1,4.9497,5.6568,0,5.6568,2.6789,1,6.4673,6.4673,1,2.6789],
// 5 24 2.6789 1 6.4673 3.0616 0 7.3912 0 1 7 4.9497 1 4.9497
  [5,24,2.6789,1,6.4673,3.0616,0,7.3912,0,1,7,4.9497,1,4.9497],
// 5 24 0 1 7 0 0 8 -2.6789 1 6.4673 2.6789 1 6.4673
  [5,24,0,1,7,0,0,8,-2.6789,1,6.4673,2.6789,1,6.4673],
// 5 24 -2.6789 1 6.4673 -3.0616 0 7.3912 -4.9497 1 4.9497 0 1 7
  [5,24,-2.6789,1,6.4673,-3.0616,0,7.3912,-4.9497,1,4.9497,0,1,7],
// 5 24 -4.9497 1 4.9497 -5.6568 0 5.6568 -6.4673 1 2.6789 -2.6789 1 6.4673
  [5,24,-4.9497,1,4.9497,-5.6568,0,5.6568,-6.4673,1,2.6789,-2.6789,1,6.4673],
// 5 24 -6.4673 1 2.6789 -7.3912 0 3.0616 -7 1 0 -4.9497 1 4.9497
  [5,24,-6.4673,1,2.6789,-7.3912,0,3.0616,-7,1,0,-4.9497,1,4.9497],
// 5 24 -7 1 0 -8 0 0 -6.4673 1 -2.6789 -6.4673 1 2.6789
  [5,24,-7,1,0,-8,0,0,-6.4673,1,-2.6789,-6.4673,1,2.6789],
// 5 24 -6.4673 1 -2.6789 -7.3912 0 -3.0616 -4.9497 1 -4.9497 -7 1 0
  [5,24,-6.4673,1,-2.6789,-7.3912,0,-3.0616,-4.9497,1,-4.9497,-7,1,0],
// 5 24 -4.9497 1 -4.9497 -5.6568 0 -5.6568 -2.6789 1 -6.4673 -6.4673 1 -2.6789
  [5,24,-4.9497,1,-4.9497,-5.6568,0,-5.6568,-2.6789,1,-6.4673,-6.4673,1,-2.6789],
// 5 24 -2.6789 1 -6.4673 -3.0616 0 -7.3912 0 1 -7 -4.9497 1 -4.9497
  [5,24,-2.6789,1,-6.4673,-3.0616,0,-7.3912,0,1,-7,-4.9497,1,-4.9497],
// 5 24 0 1 -7 0 0 -8 2.6789 1 -6.4673 -2.6789 1 -6.4673
  [5,24,0,1,-7,0,0,-8,2.6789,1,-6.4673,-2.6789,1,-6.4673],
// 5 24 2.6789 1 -6.4673 3.0616 0 -7.3912 4.9497 1 -4.9497 0 1 -7
  [5,24,2.6789,1,-6.4673,3.0616,0,-7.3912,4.9497,1,-4.9497,0,1,-7],
// 5 24 4.9497 1 -4.9497 5.6568 0 -5.6568 6.4673 1 -2.6789 2.6789 1 -6.4673
  [5,24,4.9497,1,-4.9497,5.6568,0,-5.6568,6.4673,1,-2.6789,2.6789,1,-6.4673],
// 5 24 6.4673 1 -2.6789 7.3912 0 -3.0616 7 1 0 4.9497 1 -4.9497
  [5,24,6.4673,1,-2.6789,7.3912,0,-3.0616,7,1,0,4.9497,1,-4.9497],
// 
// 4 16 7 1 0 6.4673 1 2.6789 7.3912 0 3.0616 8 0 0
  [4,16,7,1,0,6.4673,1,2.6789,7.3912,0,3.0616,8,0,0],
// 4 16 6.4673 1 2.6789 4.9497 1 4.9497 5.6568 0 5.6568 7.3912 0 3.0616
  [4,16,6.4673,1,2.6789,4.9497,1,4.9497,5.6568,0,5.6568,7.3912,0,3.0616],
// 4 16 4.9497 1 4.9497 2.6789 1 6.4673 3.0616 0 7.3912 5.6568 0 5.6568
  [4,16,4.9497,1,4.9497,2.6789,1,6.4673,3.0616,0,7.3912,5.6568,0,5.6568],
// 4 16 2.6789 1 6.4673 0 1 7 0 0 8 3.0616 0 7.3912
  [4,16,2.6789,1,6.4673,0,1,7,0,0,8,3.0616,0,7.3912],
// 4 16 0 1 7 -2.6789 1 6.4673 -3.0616 0 7.3912 0 0 8
  [4,16,0,1,7,-2.6789,1,6.4673,-3.0616,0,7.3912,0,0,8],
// 4 16 -2.6789 1 6.4673 -4.9497 1 4.9497 -5.6568 0 5.6568 -3.0616 0 7.3912
  [4,16,-2.6789,1,6.4673,-4.9497,1,4.9497,-5.6568,0,5.6568,-3.0616,0,7.3912],
// 4 16 -4.9497 1 4.9497 -6.4673 1 2.6789 -7.3912 0 3.0616 -5.6568 0 5.6568
  [4,16,-4.9497,1,4.9497,-6.4673,1,2.6789,-7.3912,0,3.0616,-5.6568,0,5.6568],
// 4 16 -6.4673 1 2.6789 -7 1 0 -8 0 0 -7.3912 0 3.0616
  [4,16,-6.4673,1,2.6789,-7,1,0,-8,0,0,-7.3912,0,3.0616],
// 4 16 -7 1 0 -6.4673 1 -2.6789 -7.3912 0 -3.0616 -8 0 0
  [4,16,-7,1,0,-6.4673,1,-2.6789,-7.3912,0,-3.0616,-8,0,0],
// 4 16 -6.4673 1 -2.6789 -4.9497 1 -4.9497 -5.6568 0 -5.6568 -7.3912 0 -3.0616
  [4,16,-6.4673,1,-2.6789,-4.9497,1,-4.9497,-5.6568,0,-5.6568,-7.3912,0,-3.0616],
// 4 16 -4.9497 1 -4.9497 -2.6789 1 -6.4673 -3.0616 0 -7.3912 -5.6568 0 -5.6568
  [4,16,-4.9497,1,-4.9497,-2.6789,1,-6.4673,-3.0616,0,-7.3912,-5.6568,0,-5.6568],
// 4 16 -2.6789 1 -6.4673 0 1 -7 0 0 -8 -3.0616 0 -7.3912
  [4,16,-2.6789,1,-6.4673,0,1,-7,0,0,-8,-3.0616,0,-7.3912],
// 4 16 0 1 -7 2.6789 1 -6.4673 3.0616 0 -7.3912 0 0 -8
  [4,16,0,1,-7,2.6789,1,-6.4673,3.0616,0,-7.3912,0,0,-8],
// 4 16 2.6789 1 -6.4673 4.9497 1 -4.9497 5.6568 0 -5.6568 3.0616 0 -7.3912
  [4,16,2.6789,1,-6.4673,4.9497,1,-4.9497,5.6568,0,-5.6568,3.0616,0,-7.3912],
// 4 16 4.9497 1 -4.9497 6.4673 1 -2.6789 7.3912 0 -3.0616 5.6568 0 -5.6568
  [4,16,4.9497,1,-4.9497,6.4673,1,-2.6789,7.3912,0,-3.0616,5.6568,0,-5.6568],
// 4 16 6.4673 1 -2.6789 7 1 0 8 0 0 7.3912 0 -3.0616
  [4,16,6.4673,1,-2.6789,7,1,0,8,0,0,7.3912,0,-3.0616],
// 
// 0
// 
];
module ldraw_lib__4_4con7(step=0, col=false, unit=2/5, alt=false, line=0.2, solid=!$preview)
    makepoly(ldraw_lib__4_4con7(), step=step, col=col, unit=unit, alt=alt, line=line, solid=solid);
ldraw_lib__4_4con7(line=0.2);
// main file
use <../../lib.scad>
use <../../p/4-4con7.scad>
use <../../p/4-4con8.scad>
use <../../p/4-4cylo.scad>
use <../../p/4-4ring2.scad>
use <../../p/4-4ring3.scad>
function ldraw_lib__s__6230s01() = [
// 0 ~Wheel  4 x 10 for Plate  2 x  2 with 2 Stub Axles
// 0 Name: s\6230s01.dat
// 0 Author: Donald Sutter [technog]
// 0 !LDRAW_ORG Subpart UPDATE 2022-04
// 0 !LICENSE Licensed under CC BY 2.0 and CC BY 4.0 : see CAreadme.txt
// 
// 0 BFC CERTIFY CCW
  [0,"BFC","CERTIFY"],
  [0,"BFC","CCW"],
// 
// 0 !HISTORY 2021-01-11 [Philo] Corrected description
// 0 !HISTORY 2022-07-18 [PTadmin] Official Update 2022-04
// 
// 
// 1 16 0 0 2 0 0 9 9 0 0 0 -4 0 4-4cylo.dat
  [1,16,0,0,2,0,0,9,9,0,0,0,-4,0, ldraw_lib__4_4cylo()],
// 1 16 0 0 2 0 0 3 3 0 0 0 -1 0 4-4ring2.dat
  [1,16,0,0,2,0,0,3,3,0,0,0,-1,0, ldraw_lib__4_4ring2()],
// 1 16 0 0 -2 0 0 3 3 0 0 0 1 0 4-4ring2.dat
  [1,16,0,0,-2,0,0,3,3,0,0,0,1,0, ldraw_lib__4_4ring2()],
// 1 16 0 0 2 0 0 6 6 0 0 0 3 0 4-4cylo.dat
  [1,16,0,0,2,0,0,6,6,0,0,0,3,0, ldraw_lib__4_4cylo()],
// 1 16 0 0 -5 0 0 6 6 0 0 0 3 0 4-4cylo.dat
  [1,16,0,0,-5,0,0,6,6,0,0,0,3,0, ldraw_lib__4_4cylo()],
// 1 16 0 0 5 0 0 1.5 1.5 0 0 0 -1 0 4-4ring3.dat
  [1,16,0,0,5,0,0,1.5,1.5,0,0,0,-1,0, ldraw_lib__4_4ring3()],
// 1 16 0 0 -5 0 0 1.5 1.5 0 0 0 1 0 4-4ring3.dat
  [1,16,0,0,-5,0,0,1.5,1.5,0,0,0,1,0, ldraw_lib__4_4ring3()],
// 
// 0 BFC INVERTNEXT
  [0,"BFC","INVERTNEXT"],
// 1 16 0 0 5 0 0 4.5 4.5 0 0 0 -2.75 0 4-4cylo.dat
  [1,16,0,0,5,0,0,4.5,4.5,0,0,0,-2.75,0, ldraw_lib__4_4cylo()],
// 0 BFC INVERTNEXT
  [0,"BFC","INVERTNEXT"],
// 1 16 0 0 2.25 0 0 -.5 .5 0 0 0 -.5 0 4-4con8.dat
  [1,16,0,0,2.25,0,0,-.5,.5,0,0,0,-.5,0, ldraw_lib__4_4con8()],
// 0 BFC INVERTNEXT
  [0,"BFC","INVERTNEXT"],
// 1 16 0 0 1.75 0 0 -.5 .5 0 0 0 -.5 0 4-4con7.dat
  [1,16,0,0,1.75,0,0,-.5,.5,0,0,0,-.5,0, ldraw_lib__4_4con7()],
// 0 BFC INVERTNEXT
  [0,"BFC","INVERTNEXT"],
// 1 16 0 0 -1.25 0 0 -3.5 3.5 0 0 0 2.5 0 4-4cylo.dat
  [1,16,0,0,-1.25,0,0,-3.5,3.5,0,0,0,2.5,0, ldraw_lib__4_4cylo()],
// 0 BFC INVERTNEXT
  [0,"BFC","INVERTNEXT"],
// 1 16 0 0 -1.75 0 0 .5 .5 0 0 0 .5 0 4-4con7.dat
  [1,16,0,0,-1.75,0,0,.5,.5,0,0,0,.5,0, ldraw_lib__4_4con7()],
// 0 BFC INVERTNEXT
  [0,"BFC","INVERTNEXT"],
// 1 16 0 0 -2.25 0 0 .5 .5 0 0 0 .5 0 4-4con8.dat
  [1,16,0,0,-2.25,0,0,.5,.5,0,0,0,.5,0, ldraw_lib__4_4con8()],
// 0 BFC INVERTNEXT
  [0,"BFC","INVERTNEXT"],
// 1 16 0 0 -5 0 0 4.5 4.5 0 0 0 2.75 0 4-4cylo.dat
  [1,16,0,0,-5,0,0,4.5,4.5,0,0,0,2.75,0, ldraw_lib__4_4cylo()],
];
module ldraw_lib__s__6230s01(step=0, col=false, unit=2/5, alt=false, line=0.2, solid=!$preview)
    makepoly(ldraw_lib__s__6230s01(), step=step, col=col, unit=unit, alt=alt, line=line, solid=solid);
ldraw_lib__s__6230s01(line=0.2);
